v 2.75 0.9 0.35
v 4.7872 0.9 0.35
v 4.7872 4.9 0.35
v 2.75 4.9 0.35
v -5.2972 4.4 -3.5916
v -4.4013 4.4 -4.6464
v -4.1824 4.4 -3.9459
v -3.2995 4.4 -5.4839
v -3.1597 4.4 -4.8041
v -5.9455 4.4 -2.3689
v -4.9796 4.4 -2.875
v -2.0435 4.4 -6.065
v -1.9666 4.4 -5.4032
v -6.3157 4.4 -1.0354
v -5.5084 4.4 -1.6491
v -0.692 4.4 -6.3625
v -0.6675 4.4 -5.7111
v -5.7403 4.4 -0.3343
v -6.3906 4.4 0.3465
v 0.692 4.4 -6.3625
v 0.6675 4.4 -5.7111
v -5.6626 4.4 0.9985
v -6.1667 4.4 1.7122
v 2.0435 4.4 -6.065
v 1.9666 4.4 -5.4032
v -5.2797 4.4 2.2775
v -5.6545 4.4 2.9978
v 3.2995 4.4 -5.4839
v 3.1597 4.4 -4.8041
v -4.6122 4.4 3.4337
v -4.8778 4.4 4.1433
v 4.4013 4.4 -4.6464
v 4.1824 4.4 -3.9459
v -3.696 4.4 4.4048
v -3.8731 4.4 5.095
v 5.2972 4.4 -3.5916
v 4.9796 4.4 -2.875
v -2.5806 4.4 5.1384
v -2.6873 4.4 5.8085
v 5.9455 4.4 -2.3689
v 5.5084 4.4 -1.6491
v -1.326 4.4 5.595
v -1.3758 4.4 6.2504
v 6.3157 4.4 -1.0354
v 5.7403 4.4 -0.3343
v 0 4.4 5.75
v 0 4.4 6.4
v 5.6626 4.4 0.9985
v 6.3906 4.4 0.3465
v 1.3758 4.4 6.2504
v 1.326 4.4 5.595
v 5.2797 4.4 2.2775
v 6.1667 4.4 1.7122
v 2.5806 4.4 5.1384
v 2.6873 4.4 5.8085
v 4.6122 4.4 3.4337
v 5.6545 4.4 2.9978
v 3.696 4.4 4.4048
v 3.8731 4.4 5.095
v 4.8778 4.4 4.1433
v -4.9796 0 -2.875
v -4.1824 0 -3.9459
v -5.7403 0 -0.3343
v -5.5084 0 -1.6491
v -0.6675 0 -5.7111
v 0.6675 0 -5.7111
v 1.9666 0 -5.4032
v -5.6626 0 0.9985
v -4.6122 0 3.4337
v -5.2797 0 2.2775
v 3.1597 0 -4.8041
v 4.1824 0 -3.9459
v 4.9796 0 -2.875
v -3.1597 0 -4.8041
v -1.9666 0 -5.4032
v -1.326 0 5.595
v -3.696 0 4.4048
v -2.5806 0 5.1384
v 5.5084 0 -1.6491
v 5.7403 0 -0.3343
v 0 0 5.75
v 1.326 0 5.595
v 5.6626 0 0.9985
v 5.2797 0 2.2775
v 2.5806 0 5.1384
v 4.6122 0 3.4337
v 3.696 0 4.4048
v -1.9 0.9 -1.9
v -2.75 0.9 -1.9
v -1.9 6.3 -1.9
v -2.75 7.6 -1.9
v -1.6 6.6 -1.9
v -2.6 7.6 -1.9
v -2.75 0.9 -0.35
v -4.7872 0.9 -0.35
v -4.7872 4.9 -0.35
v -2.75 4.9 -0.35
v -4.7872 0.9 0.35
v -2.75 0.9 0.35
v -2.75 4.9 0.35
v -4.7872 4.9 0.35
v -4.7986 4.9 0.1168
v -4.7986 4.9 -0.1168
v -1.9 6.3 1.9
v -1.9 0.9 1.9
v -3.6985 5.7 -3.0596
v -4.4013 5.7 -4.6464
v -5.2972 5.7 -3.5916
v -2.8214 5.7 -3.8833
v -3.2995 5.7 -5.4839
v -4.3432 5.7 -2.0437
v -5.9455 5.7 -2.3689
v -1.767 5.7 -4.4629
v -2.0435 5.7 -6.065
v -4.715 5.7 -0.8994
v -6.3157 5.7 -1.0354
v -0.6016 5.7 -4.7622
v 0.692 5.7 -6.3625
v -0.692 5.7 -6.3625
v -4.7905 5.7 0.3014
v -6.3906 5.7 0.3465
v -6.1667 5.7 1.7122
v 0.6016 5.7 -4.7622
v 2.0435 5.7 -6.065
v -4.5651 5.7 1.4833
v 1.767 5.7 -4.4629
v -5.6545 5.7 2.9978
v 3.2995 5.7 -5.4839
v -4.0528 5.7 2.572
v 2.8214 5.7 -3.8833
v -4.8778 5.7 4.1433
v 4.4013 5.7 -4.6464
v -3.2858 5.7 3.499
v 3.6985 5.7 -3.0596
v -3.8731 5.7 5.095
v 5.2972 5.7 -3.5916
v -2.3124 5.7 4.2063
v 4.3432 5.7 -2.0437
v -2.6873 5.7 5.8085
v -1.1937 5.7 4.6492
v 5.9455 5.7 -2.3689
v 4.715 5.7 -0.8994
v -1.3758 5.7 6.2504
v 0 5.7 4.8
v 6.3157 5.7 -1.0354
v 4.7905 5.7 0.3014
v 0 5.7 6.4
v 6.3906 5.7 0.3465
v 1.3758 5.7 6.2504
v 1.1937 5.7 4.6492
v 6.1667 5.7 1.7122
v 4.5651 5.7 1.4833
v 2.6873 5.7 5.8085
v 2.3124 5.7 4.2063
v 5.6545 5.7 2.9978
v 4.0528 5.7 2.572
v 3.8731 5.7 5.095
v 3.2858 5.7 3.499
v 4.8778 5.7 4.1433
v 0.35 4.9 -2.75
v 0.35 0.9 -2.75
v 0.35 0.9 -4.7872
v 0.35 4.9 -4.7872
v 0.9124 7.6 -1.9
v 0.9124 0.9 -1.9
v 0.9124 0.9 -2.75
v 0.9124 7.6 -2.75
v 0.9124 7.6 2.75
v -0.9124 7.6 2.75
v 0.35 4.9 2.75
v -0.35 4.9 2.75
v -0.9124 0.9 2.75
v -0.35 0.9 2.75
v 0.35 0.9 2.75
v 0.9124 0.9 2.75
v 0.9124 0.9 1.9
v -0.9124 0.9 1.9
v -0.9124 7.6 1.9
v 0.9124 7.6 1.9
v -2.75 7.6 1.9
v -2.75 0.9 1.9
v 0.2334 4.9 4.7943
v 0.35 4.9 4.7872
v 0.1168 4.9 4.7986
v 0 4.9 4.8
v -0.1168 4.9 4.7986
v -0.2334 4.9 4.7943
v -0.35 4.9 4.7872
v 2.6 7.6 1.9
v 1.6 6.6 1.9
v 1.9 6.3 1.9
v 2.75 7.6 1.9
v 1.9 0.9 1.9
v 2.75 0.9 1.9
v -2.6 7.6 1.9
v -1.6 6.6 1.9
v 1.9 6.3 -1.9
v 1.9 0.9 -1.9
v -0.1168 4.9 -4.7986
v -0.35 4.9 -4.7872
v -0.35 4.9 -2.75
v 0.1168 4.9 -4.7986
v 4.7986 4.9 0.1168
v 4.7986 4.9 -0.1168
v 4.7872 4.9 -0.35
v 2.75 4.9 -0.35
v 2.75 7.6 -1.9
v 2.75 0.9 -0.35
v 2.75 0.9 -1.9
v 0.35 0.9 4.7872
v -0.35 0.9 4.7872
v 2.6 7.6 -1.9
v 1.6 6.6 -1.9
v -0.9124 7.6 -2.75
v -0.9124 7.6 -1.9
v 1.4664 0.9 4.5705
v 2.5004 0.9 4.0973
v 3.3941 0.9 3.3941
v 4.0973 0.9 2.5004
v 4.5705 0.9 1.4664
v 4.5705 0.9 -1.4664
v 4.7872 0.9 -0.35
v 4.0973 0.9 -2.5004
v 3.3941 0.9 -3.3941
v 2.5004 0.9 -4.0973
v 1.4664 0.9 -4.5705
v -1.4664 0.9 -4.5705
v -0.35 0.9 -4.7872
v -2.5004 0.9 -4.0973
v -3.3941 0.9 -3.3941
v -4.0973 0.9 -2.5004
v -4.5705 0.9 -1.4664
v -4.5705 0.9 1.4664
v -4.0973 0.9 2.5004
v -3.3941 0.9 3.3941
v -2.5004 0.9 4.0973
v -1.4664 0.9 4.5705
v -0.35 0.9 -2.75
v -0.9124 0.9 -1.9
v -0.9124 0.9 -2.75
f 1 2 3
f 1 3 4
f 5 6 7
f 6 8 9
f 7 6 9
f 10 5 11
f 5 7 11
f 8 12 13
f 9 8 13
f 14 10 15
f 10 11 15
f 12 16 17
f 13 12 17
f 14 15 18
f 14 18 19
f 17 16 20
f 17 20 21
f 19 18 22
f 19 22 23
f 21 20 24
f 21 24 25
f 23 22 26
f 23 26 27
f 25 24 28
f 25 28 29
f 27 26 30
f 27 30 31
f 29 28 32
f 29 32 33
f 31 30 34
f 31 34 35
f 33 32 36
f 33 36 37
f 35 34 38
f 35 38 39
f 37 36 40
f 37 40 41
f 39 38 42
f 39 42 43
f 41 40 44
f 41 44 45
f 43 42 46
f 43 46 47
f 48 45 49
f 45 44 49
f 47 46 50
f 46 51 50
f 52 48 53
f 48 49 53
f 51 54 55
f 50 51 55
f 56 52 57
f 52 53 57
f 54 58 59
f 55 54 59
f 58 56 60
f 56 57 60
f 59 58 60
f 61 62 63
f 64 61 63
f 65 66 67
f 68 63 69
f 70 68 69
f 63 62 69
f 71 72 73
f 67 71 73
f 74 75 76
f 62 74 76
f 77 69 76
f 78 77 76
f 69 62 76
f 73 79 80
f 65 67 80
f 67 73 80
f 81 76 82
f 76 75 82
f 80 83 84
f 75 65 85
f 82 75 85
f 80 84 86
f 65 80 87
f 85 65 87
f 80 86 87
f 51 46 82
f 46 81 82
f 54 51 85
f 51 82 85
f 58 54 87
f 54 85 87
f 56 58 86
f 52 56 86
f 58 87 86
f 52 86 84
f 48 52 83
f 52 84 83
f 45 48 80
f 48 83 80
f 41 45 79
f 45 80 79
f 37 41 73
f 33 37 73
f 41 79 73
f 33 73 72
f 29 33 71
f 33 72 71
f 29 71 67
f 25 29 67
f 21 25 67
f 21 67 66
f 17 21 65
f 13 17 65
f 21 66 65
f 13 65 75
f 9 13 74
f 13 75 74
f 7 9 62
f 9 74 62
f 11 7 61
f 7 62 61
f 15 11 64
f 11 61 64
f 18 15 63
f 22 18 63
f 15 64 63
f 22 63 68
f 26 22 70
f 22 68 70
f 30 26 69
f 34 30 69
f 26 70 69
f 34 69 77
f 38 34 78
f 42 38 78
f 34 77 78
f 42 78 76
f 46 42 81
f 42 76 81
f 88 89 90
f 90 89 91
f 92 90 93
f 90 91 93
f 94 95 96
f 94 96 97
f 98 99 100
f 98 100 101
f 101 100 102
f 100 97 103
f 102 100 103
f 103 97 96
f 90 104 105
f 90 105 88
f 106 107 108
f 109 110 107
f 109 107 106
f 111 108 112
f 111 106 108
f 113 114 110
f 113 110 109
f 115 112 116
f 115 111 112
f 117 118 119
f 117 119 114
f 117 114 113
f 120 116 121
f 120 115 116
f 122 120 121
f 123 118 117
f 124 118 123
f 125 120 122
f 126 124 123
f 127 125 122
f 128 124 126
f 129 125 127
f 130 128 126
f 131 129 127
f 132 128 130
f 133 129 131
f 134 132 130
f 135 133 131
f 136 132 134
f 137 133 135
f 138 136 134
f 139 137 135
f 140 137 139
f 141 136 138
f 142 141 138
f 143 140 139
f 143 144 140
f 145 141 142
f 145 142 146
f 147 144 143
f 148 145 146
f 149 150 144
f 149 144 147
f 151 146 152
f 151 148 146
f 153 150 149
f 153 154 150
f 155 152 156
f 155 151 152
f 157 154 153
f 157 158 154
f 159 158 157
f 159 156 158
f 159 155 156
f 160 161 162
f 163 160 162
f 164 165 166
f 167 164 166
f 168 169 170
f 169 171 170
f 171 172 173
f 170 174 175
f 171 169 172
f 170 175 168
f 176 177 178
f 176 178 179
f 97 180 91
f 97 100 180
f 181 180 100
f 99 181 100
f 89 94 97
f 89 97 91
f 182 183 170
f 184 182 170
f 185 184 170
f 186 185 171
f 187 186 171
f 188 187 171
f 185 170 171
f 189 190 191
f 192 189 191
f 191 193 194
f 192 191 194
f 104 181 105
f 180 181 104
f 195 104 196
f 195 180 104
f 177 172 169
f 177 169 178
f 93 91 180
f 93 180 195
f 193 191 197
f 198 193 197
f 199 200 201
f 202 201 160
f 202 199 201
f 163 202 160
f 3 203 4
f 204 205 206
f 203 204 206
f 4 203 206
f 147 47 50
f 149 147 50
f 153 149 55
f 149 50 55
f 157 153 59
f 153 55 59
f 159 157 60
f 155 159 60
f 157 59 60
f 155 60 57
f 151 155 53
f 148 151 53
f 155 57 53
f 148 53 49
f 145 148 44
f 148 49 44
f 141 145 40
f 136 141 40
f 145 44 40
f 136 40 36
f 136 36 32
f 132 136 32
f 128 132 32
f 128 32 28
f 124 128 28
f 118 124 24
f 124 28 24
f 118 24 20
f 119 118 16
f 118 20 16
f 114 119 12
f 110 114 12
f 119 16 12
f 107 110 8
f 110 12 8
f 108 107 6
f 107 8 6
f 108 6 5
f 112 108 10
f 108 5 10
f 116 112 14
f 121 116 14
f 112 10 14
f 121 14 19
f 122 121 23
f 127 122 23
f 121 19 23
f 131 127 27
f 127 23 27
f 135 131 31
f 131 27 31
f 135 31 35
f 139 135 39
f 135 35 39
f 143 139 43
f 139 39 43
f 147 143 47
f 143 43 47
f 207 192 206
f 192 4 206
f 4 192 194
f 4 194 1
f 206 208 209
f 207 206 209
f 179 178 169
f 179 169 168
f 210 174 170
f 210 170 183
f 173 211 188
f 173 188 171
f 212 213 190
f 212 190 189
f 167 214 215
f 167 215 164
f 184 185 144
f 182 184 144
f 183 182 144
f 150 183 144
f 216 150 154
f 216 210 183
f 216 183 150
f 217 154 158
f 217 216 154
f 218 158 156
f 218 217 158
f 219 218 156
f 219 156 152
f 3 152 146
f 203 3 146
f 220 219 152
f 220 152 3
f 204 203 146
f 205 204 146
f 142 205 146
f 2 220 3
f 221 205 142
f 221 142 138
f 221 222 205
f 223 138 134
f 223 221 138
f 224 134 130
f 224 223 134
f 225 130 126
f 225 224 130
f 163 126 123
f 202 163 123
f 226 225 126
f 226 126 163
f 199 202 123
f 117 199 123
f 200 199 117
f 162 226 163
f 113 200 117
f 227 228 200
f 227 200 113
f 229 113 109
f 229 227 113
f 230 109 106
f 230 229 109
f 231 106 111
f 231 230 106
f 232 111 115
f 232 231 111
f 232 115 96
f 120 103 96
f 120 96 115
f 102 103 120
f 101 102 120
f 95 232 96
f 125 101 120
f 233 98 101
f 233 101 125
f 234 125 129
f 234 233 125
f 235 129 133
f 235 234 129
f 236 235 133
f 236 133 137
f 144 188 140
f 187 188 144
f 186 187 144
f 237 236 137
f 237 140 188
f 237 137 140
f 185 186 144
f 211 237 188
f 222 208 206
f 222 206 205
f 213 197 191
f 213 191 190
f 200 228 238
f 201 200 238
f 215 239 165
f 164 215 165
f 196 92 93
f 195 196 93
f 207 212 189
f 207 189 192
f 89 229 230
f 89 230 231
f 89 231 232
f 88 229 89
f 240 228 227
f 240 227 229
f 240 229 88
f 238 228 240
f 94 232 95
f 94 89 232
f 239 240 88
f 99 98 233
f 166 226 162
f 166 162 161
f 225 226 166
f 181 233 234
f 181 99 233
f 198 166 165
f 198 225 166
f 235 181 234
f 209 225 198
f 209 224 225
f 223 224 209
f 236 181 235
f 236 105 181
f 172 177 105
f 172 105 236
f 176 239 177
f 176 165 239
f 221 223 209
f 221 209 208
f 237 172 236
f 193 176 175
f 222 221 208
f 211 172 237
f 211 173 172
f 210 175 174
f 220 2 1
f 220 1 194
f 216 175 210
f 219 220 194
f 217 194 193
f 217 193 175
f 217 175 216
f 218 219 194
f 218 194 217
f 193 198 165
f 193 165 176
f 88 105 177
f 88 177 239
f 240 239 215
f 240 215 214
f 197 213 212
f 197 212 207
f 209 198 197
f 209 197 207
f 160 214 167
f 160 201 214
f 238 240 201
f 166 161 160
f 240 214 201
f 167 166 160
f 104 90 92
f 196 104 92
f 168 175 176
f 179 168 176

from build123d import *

# Parameters (mm, degrees)
SKETCH_1_R          = 5.75
EXTRUDE_1_DEPTH     = 0.9
SKETCH_2_R          = 5.75
SKETCH_2_R_2        = 4.8
EXTRUDE_2_DEPTH     = 3.5
SKETCH_3_R          = 6.4
SKETCH_3_R_2        = 4.8
EXTRUDE_3_DEPTH     = 1.3
SKETCH_4_W          = 0.85
SKETCH_4_H          = 3.8
SKETCH_4_W_2        = 1.824882422
SKETCH_4_H_2        = 0.85
EXTRUDE_4_DEPTH     = 6.7
EXTRUDE_5_DEPTH     = 3.8
CUT_EXTRUDE_1_REACH = 14.946
EXTRUDE_6_DEPTH     = 4


with BuildPart() as part:
    # Эскиз1 → Бобышка-Вытянуть1 (new body)
    with BuildSketch(Plane(origin=(0, 0, 0), x_dir=(1, 0, 0), z_dir=(0, 1, 0))):
        with Locations(Location((0, 0, 0), (0, 0, 270))):
            Circle(SKETCH_1_R)
    extrude(amount=EXTRUDE_1_DEPTH)

    # Эскиз2 → Бобышка-Вытянуть2 (add)
    with BuildSketch(Plane(origin=(0, 0.9, 0), x_dir=(1, 0, 0), z_dir=(0, 1, 0))):
        with Locations(Location((0, 0, 0), (0, 0, 270))):
            Circle(SKETCH_2_R)
        with Locations(Location((0, 0, 0), (0, 0, 270))):
            Circle(SKETCH_2_R_2, mode=Mode.SUBTRACT)
    extrude(amount=EXTRUDE_2_DEPTH)

    # Эскиз3 → Бобышка-Вытянуть3 (add)
    with BuildSketch(Plane(origin=(0, 4.4, 0), x_dir=(1, 0, 0), z_dir=(0, 1, 0))):
        with Locations(Location((0, 0, 0), (0, 0, 270))):
            Circle(SKETCH_3_R)
        with Locations(Location((0, 0, 0), (0, 0, 270))):
            Circle(SKETCH_3_R_2, mode=Mode.SUBTRACT)
    extrude(amount=EXTRUDE_3_DEPTH)

    # Эскиз4 → Бобышка-Вытянуть4 (add)
    with BuildSketch(Plane(origin=(0, 0.9, 0), x_dir=(1, 0, 0), z_dir=(0, 1, 0))):
        with Locations((-2.325, 0)):
            Rectangle(SKETCH_4_W, SKETCH_4_H)
        with Locations((2.325, 0)):
            Rectangle(SKETCH_4_W, SKETCH_4_H)
        with Locations((0, 2.325)):
            Rectangle(SKETCH_4_W_2, SKETCH_4_H_2)
        with Locations((0, -2.325)):
            Rectangle(SKETCH_4_W_2, SKETCH_4_H_2)
    extrude(amount=EXTRUDE_4_DEPTH)

    # Эскиз5 → Бобышка-Вытянуть5 (add)
    with BuildSketch(Plane(origin=(0, 0, -1.9), x_dir=(-1, 0, 0), z_dir=(0, 0, -1))):
        Polygon((1.9, 6.3), (1.6, 6.6), (2.6, 7.6), align=None)
        Polygon((-1.9, 6.3), (-1.6, 6.6), (-2.6, 7.6), align=None)
    extrude(amount=-EXTRUDE_5_DEPTH)

    # Эскиз6 → Вырез-Вытянуть1 (cut, up to next)
    with BuildSketch(Plane(origin=(0, 0, -1.9), x_dir=(-1, 0, 0), z_dir=(0, 0, -1)), mode=Mode.PRIVATE) as cut_extrude_1_sk1:
        Polygon((1.9, 6.9), (2.6, 7.6), (1.9, 7.6), align=None)
    cut_extrude_1_tool1 = extrude(cut_extrude_1_sk1.sketch, amount=-CUT_EXTRUDE_1_REACH, mode=Mode.PRIVATE) & part.part
    # Эскиз6 → Вырез-Вытянуть1 (cut, up to next)
    with BuildSketch(Plane(origin=(0, 0, -1.9), x_dir=(-1, 0, 0), z_dir=(0, 0, -1)), mode=Mode.PRIVATE) as cut_extrude_1_sk2:
        Polygon((-1.9, 6.9), (-2.6, 7.6), (-1.9, 7.6), align=None)
    cut_extrude_1_tool2 = extrude(cut_extrude_1_sk2.sketch, amount=-CUT_EXTRUDE_1_REACH, mode=Mode.PRIVATE) & part.part
    add(cut_extrude_1_tool1.solids().sort_by_distance((-2.133333, 7.366667, -1.9))[0], mode=Mode.SUBTRACT)
    add(cut_extrude_1_tool2.solids().sort_by_distance((2.133333, 7.366667, -1.9))[0], mode=Mode.SUBTRACT)

    # Эскиз7 → Бобышка-Вытянуть6 (add)
    with BuildSketch(Plane(origin=(0, 0.9, 0), x_dir=(1, 0, 0), z_dir=(0, 1, 0))):
        with BuildLine():
            Line((-0.35, -2.75), (0.35, -2.75))
            Line((0.35, -2.75), (0.35, -4.787222577))
            ThreePointArc((0.35, -4.787222577), (0, -4.8), (-0.35, -4.787222577))
            Line((-0.35, -4.787222577), (-0.35, -2.75))
        make_face()
        with BuildLine():
            Line((4.787222577, -0.35), (2.75, -0.35))
            Line((2.75, -0.35), (2.75, 0.35))
            Line((2.75, 0.35), (4.787222577, 0.35))
            ThreePointArc((4.787222577, 0.35), (4.8, 0), (4.787222577, -0.35))
        make_face()
        with BuildLine():
            Line((0.35, 2.75), (0.35, 4.787222577))
            ThreePointArc((0.35, 4.787222577), (0, 4.8), (-0.35, 4.787222577))
            Line((-0.35, 4.787222577), (-0.35, 2.75))
            Line((-0.35, 2.75), (0.35, 2.75))
        make_face()
        with BuildLine():
            Line((-2.75, -0.35), (-4.787222577, -0.35))
            ThreePointArc((-4.787222577, -0.35), (-4.8, 0), (-4.787222577, 0.35))
            Line((-4.787222577, 0.35), (-2.75, 0.35))
            Line((-2.75, 0.35), (-2.75, -0.35))
        make_face()
    extrude(amount=EXTRUDE_6_DEPTH)


solid = part.part
